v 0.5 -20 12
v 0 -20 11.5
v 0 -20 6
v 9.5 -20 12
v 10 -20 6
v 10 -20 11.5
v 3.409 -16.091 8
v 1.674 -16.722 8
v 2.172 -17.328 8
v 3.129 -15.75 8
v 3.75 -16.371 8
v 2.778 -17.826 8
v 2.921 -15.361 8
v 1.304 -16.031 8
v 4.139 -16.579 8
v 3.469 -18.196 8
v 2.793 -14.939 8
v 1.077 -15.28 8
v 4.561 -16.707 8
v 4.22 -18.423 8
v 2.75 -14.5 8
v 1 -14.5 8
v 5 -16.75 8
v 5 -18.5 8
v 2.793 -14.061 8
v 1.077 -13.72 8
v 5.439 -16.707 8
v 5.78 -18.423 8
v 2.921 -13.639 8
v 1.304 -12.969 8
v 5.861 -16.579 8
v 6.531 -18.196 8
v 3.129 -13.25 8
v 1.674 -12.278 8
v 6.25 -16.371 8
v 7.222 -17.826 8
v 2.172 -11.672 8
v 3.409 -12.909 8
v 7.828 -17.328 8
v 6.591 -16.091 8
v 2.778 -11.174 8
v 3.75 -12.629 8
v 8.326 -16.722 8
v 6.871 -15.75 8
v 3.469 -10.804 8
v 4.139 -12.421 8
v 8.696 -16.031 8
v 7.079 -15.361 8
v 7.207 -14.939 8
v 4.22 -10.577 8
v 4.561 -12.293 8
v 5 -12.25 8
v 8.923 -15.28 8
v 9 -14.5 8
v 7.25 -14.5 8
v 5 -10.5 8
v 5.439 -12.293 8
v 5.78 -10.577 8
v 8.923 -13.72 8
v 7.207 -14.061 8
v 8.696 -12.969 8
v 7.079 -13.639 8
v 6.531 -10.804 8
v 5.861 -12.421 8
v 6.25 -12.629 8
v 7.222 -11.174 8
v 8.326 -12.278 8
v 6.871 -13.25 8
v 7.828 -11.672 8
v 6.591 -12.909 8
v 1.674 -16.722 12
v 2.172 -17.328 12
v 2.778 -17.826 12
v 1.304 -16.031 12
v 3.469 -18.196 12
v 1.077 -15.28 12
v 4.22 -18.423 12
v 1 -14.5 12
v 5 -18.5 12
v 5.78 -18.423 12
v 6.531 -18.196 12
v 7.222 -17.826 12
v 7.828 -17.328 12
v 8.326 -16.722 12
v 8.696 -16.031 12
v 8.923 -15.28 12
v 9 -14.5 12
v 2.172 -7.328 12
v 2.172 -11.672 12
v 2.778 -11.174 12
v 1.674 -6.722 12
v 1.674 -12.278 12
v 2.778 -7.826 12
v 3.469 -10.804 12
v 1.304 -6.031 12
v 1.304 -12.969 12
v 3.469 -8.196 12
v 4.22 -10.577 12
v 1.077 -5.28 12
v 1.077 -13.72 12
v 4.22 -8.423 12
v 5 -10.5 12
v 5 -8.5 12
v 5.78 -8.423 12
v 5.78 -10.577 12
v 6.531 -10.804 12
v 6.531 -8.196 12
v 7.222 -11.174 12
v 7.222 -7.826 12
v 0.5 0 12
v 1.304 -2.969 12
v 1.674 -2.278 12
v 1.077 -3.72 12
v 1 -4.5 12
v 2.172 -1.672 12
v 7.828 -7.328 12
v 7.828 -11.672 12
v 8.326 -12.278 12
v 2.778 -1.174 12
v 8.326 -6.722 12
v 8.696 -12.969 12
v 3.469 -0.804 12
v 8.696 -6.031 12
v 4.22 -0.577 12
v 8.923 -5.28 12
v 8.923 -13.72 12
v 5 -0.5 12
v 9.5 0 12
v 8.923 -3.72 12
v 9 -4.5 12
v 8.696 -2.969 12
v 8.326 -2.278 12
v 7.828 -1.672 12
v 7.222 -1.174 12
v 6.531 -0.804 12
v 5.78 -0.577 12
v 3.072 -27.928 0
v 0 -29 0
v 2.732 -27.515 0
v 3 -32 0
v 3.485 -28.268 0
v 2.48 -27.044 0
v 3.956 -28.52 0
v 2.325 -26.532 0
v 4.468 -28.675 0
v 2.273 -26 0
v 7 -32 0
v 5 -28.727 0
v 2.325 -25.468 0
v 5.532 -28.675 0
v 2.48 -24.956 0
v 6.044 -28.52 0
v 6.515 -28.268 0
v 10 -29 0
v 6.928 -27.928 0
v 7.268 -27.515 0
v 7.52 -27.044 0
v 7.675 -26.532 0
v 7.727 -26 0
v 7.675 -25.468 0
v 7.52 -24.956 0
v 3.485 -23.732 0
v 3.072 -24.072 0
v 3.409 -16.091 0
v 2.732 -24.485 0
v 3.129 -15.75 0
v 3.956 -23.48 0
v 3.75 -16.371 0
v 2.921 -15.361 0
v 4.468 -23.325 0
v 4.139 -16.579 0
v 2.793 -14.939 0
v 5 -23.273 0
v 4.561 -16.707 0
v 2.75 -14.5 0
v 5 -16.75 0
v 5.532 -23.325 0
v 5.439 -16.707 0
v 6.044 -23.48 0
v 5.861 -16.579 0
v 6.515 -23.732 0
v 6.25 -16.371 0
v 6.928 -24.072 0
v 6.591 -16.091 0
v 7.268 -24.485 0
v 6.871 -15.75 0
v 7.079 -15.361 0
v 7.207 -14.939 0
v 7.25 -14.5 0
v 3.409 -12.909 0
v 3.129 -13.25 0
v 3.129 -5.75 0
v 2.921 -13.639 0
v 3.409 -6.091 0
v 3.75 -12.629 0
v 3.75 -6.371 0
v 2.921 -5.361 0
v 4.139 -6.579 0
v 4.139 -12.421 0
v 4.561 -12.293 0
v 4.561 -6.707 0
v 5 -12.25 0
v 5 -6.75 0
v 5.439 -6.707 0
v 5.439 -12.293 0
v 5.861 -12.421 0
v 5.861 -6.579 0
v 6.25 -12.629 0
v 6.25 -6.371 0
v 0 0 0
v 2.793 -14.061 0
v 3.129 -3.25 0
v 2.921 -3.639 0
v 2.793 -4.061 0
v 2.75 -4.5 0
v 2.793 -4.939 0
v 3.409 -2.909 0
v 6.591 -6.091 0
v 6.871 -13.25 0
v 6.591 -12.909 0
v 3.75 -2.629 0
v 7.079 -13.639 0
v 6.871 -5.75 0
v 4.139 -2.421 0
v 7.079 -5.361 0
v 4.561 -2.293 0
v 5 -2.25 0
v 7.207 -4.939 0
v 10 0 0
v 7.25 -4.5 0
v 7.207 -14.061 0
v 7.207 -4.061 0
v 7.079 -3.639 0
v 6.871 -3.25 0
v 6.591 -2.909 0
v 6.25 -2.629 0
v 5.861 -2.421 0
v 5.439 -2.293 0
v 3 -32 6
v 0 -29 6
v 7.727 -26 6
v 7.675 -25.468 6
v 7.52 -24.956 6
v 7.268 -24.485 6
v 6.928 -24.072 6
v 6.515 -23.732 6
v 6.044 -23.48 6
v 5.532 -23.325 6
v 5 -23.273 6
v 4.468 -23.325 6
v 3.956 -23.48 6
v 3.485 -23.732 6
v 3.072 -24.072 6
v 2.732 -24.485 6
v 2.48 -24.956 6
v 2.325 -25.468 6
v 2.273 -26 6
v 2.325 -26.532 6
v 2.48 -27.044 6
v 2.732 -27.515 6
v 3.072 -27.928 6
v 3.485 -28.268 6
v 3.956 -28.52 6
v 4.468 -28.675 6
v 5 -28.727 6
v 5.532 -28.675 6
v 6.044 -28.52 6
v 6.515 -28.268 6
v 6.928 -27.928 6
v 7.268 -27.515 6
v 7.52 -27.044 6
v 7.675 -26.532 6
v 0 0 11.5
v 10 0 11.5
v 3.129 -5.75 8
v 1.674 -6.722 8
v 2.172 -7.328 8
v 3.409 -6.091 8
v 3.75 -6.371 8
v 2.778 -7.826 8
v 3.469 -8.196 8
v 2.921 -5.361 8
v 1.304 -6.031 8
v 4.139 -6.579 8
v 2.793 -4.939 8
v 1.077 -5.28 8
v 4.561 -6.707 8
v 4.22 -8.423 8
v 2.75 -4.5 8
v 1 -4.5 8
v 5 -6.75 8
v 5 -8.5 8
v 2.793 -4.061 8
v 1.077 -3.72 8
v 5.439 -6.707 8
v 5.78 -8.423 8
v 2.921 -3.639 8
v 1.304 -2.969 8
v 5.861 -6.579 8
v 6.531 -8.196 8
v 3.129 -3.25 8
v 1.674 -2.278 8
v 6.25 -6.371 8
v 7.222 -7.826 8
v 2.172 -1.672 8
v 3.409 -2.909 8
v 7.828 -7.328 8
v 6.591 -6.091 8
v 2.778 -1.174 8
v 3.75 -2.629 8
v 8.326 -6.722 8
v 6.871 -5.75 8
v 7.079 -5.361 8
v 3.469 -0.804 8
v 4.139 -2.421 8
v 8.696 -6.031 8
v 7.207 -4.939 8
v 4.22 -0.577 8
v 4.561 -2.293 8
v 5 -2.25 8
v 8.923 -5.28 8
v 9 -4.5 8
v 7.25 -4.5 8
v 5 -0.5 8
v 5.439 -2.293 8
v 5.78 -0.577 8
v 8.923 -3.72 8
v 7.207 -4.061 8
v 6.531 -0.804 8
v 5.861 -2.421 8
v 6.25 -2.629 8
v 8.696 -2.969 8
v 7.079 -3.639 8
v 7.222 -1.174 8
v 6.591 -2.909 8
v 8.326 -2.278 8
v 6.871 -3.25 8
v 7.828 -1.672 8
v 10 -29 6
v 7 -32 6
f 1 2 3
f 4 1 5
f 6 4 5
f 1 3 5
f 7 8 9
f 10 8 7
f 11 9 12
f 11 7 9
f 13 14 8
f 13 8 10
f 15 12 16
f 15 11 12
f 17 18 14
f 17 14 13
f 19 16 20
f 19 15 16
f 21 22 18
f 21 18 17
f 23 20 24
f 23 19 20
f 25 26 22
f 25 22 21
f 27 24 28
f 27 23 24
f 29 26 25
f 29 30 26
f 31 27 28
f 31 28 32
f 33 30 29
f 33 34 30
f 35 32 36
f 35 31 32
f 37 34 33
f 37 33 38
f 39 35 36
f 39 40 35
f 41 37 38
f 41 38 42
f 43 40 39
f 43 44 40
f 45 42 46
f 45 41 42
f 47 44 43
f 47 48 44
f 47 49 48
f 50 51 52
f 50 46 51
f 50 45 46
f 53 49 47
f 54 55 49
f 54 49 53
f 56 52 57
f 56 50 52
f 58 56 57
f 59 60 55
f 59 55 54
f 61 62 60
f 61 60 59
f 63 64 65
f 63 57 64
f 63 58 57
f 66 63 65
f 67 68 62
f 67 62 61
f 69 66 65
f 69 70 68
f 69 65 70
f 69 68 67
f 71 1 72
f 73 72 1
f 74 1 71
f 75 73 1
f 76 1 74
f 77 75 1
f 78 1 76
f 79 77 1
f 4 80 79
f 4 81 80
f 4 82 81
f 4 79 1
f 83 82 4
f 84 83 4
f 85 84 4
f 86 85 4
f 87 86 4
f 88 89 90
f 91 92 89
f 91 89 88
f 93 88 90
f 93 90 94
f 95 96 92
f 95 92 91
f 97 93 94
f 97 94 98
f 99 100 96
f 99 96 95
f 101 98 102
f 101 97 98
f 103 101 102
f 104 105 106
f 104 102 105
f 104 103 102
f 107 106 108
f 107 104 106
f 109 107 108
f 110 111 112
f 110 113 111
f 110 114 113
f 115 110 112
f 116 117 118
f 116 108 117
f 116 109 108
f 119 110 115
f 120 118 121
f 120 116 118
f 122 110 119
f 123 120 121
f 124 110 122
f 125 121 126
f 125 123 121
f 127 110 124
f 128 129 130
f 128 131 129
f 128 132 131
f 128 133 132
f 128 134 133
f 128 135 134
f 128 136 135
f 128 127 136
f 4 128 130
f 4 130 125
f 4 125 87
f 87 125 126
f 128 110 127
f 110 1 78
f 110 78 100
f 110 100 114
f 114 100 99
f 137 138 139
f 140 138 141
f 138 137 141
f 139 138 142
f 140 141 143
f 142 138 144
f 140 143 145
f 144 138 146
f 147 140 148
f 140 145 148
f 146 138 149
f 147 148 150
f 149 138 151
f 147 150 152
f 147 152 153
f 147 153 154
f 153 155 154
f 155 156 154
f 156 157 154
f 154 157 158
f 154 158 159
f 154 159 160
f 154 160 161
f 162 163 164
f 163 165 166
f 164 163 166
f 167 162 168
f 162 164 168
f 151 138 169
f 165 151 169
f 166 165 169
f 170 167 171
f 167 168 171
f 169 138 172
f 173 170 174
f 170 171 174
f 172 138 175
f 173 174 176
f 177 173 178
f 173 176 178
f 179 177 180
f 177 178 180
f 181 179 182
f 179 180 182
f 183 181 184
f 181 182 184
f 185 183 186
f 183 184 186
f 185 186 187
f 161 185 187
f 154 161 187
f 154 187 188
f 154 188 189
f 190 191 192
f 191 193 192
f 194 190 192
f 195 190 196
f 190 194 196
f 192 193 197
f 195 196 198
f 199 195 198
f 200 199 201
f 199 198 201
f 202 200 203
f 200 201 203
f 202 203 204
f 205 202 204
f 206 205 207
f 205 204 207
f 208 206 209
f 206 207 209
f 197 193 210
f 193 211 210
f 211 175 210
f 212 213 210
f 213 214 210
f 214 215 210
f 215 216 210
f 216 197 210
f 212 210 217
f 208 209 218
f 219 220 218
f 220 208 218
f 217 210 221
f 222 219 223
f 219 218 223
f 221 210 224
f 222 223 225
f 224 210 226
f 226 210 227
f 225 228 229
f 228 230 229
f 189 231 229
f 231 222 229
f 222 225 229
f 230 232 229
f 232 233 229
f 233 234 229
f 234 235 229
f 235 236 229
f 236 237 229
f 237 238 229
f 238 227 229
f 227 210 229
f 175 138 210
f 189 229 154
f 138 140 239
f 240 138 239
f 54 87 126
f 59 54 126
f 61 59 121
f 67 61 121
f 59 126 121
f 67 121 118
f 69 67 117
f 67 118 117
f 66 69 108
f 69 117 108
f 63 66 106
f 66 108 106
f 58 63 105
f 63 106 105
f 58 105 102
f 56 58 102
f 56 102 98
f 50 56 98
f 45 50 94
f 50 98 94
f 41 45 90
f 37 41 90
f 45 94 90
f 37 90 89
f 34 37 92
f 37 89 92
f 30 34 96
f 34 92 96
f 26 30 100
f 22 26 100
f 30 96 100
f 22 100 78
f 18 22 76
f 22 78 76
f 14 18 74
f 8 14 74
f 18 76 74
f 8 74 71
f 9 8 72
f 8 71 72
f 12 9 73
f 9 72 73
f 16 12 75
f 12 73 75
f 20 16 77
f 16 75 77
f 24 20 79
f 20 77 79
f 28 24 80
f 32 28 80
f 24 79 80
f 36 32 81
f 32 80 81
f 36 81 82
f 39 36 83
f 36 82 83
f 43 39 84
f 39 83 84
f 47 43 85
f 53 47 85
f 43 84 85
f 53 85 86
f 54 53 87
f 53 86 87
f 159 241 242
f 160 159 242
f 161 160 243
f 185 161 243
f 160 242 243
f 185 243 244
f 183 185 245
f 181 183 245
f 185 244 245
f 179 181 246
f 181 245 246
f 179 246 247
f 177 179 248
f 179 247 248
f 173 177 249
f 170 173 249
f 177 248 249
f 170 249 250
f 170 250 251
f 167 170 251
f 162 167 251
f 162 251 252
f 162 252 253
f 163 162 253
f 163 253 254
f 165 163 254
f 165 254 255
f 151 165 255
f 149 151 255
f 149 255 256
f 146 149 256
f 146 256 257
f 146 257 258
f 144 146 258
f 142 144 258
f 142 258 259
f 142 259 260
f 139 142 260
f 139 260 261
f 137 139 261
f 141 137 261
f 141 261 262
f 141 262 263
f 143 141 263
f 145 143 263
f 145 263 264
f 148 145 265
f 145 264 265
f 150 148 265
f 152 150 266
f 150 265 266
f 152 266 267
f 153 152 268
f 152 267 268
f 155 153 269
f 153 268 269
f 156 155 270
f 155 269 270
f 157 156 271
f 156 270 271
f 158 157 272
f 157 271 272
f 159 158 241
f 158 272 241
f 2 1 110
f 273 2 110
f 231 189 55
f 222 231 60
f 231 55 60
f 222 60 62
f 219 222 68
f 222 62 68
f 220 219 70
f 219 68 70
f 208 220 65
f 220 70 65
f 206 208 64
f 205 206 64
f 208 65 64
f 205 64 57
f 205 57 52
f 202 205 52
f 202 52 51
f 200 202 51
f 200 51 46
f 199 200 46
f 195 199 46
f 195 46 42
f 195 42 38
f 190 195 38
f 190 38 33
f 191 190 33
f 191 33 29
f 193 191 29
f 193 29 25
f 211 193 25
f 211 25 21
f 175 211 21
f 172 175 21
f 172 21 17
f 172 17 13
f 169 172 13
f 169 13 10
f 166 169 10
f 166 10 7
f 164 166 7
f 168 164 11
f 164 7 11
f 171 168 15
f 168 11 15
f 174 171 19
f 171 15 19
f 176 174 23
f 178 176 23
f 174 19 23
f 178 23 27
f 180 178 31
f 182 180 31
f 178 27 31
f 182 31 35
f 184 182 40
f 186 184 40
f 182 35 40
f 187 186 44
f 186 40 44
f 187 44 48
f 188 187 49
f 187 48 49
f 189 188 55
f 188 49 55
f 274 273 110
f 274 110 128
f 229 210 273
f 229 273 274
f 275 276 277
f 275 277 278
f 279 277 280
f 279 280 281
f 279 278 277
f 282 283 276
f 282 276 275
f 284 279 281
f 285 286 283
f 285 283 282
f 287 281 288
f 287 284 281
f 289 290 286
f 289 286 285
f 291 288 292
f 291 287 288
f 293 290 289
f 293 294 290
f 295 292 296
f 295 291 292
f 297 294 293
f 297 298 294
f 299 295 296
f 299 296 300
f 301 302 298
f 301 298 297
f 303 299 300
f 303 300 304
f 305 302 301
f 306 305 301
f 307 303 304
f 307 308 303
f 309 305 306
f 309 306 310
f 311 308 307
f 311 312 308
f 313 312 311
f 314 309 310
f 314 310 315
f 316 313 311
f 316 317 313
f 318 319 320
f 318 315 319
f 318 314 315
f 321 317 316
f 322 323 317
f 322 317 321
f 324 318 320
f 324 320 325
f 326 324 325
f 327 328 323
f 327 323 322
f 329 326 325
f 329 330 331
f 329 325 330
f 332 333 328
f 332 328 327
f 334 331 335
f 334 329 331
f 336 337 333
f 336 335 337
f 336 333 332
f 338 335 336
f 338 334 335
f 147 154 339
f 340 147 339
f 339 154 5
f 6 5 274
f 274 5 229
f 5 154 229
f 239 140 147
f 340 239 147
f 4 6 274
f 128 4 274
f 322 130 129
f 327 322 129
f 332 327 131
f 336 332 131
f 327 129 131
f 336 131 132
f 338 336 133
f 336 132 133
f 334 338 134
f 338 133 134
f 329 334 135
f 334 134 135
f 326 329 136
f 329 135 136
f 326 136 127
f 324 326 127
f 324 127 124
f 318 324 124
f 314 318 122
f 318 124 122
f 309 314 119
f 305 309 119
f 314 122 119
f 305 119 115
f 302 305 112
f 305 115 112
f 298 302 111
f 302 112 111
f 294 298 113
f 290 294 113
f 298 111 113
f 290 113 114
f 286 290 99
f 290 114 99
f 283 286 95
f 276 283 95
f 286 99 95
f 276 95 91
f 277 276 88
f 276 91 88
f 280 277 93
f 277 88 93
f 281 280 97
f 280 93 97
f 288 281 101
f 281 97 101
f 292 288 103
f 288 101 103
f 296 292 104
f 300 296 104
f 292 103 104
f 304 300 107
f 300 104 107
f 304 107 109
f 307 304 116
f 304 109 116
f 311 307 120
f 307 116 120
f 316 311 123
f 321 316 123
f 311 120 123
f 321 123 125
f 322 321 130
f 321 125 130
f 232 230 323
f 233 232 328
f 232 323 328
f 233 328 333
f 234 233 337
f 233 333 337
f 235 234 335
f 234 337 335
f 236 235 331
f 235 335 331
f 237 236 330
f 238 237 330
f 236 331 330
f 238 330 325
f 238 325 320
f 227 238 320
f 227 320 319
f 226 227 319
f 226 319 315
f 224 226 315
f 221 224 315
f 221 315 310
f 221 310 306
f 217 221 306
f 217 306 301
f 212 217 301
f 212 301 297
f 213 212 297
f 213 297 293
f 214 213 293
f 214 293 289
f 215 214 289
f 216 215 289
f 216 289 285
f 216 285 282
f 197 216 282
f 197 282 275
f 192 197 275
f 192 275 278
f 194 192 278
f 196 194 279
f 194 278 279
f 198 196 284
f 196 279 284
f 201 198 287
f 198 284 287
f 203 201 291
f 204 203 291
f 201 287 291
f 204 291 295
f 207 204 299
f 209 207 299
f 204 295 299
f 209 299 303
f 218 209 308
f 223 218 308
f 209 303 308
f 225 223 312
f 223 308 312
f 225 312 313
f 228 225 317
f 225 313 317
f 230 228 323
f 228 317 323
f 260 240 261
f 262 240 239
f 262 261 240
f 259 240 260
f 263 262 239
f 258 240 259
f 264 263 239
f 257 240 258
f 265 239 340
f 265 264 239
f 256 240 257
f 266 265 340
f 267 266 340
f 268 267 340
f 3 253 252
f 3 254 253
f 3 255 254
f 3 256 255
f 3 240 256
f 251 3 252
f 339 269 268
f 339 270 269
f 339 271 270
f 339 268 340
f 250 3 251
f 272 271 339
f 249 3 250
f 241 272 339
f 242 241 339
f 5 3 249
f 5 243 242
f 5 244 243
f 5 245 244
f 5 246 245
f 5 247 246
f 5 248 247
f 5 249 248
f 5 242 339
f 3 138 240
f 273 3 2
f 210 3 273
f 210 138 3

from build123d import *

# Parameters (mm, degrees)
SKETCH1_W           = 10
SKETCH1_H           = 32
BOSS_EXTRUDE1_DEPTH = 6
SKETCH2_W           = 10
SKETCH2_H           = 20
BOSS_EXTRUDE2_DEPTH = 6
SKETCH3_R           = 2.25
CUT_EXTRUDE1_DEPTH  = 13
SKETCH4_R           = 4
CUT_EXTRUDE2_DEPTH  = 4
CHAMFER1_SIZE       = 3
CHAMFER2_SIZE       = 0.5
SKETCH5_R           = 2.727238267
CUT_EXTRUDE3_DEPTH  = 7


with BuildPart() as part:
    # Sketch1 → Boss-Extrude1 (new body)
    with BuildSketch(Plane.XY):
        with Locations((5, -16)):
            Rectangle(SKETCH1_W, SKETCH1_H)
    extrude(amount=BOSS_EXTRUDE1_DEPTH)

    # Sketch2 → Boss-Extrude2 (add)
    with BuildSketch(Plane.XY.offset(6)):
        with Locations((5, -10)):
            Rectangle(SKETCH2_W, SKETCH2_H)
    extrude(amount=BOSS_EXTRUDE2_DEPTH)

    # Sketch3 → Cut-Extrude1 (cut, through all)
    with BuildSketch(Plane.XY.offset(12)):
        with Locations((5, -4.5)):
            Circle(SKETCH3_R)
        with Locations((5, -14.5)):
            Circle(SKETCH3_R)
    extrude(amount=-CUT_EXTRUDE1_DEPTH, mode=Mode.SUBTRACT)

    # Sketch4 → Cut-Extrude2 (cut)
    with BuildSketch(Plane.XY.offset(12)):
        with Locations((5, -4.5)):
            Circle(SKETCH4_R)
        with Locations((5, -14.5)):
            Circle(SKETCH4_R)
    extrude(amount=-CUT_EXTRUDE2_DEPTH, mode=Mode.SUBTRACT)

    # Chamfer1
    chamfer1_edges = [part.edges().sort_by_distance(p)[0] for p in [
        (10, -32, 3),
        (0, -32, 3),
    ]]
    chamfer(chamfer1_edges, length=CHAMFER1_SIZE)

    # Chamfer2
    chamfer2_edges = [part.edges().sort_by_distance(p)[0] for p in [
        (0, -10, 12),
        (10, -10, 12),
    ]]
    chamfer(chamfer2_edges, length=CHAMFER2_SIZE)

    # Sketch5 → Cut-Extrude3 (cut, through all)
    with BuildSketch(Plane.XY.offset(6)):
        with Locations((5, -26)):
            Circle(SKETCH5_R)
    extrude(amount=-CUT_EXTRUDE3_DEPTH, mode=Mode.SUBTRACT)


solid = part.part
